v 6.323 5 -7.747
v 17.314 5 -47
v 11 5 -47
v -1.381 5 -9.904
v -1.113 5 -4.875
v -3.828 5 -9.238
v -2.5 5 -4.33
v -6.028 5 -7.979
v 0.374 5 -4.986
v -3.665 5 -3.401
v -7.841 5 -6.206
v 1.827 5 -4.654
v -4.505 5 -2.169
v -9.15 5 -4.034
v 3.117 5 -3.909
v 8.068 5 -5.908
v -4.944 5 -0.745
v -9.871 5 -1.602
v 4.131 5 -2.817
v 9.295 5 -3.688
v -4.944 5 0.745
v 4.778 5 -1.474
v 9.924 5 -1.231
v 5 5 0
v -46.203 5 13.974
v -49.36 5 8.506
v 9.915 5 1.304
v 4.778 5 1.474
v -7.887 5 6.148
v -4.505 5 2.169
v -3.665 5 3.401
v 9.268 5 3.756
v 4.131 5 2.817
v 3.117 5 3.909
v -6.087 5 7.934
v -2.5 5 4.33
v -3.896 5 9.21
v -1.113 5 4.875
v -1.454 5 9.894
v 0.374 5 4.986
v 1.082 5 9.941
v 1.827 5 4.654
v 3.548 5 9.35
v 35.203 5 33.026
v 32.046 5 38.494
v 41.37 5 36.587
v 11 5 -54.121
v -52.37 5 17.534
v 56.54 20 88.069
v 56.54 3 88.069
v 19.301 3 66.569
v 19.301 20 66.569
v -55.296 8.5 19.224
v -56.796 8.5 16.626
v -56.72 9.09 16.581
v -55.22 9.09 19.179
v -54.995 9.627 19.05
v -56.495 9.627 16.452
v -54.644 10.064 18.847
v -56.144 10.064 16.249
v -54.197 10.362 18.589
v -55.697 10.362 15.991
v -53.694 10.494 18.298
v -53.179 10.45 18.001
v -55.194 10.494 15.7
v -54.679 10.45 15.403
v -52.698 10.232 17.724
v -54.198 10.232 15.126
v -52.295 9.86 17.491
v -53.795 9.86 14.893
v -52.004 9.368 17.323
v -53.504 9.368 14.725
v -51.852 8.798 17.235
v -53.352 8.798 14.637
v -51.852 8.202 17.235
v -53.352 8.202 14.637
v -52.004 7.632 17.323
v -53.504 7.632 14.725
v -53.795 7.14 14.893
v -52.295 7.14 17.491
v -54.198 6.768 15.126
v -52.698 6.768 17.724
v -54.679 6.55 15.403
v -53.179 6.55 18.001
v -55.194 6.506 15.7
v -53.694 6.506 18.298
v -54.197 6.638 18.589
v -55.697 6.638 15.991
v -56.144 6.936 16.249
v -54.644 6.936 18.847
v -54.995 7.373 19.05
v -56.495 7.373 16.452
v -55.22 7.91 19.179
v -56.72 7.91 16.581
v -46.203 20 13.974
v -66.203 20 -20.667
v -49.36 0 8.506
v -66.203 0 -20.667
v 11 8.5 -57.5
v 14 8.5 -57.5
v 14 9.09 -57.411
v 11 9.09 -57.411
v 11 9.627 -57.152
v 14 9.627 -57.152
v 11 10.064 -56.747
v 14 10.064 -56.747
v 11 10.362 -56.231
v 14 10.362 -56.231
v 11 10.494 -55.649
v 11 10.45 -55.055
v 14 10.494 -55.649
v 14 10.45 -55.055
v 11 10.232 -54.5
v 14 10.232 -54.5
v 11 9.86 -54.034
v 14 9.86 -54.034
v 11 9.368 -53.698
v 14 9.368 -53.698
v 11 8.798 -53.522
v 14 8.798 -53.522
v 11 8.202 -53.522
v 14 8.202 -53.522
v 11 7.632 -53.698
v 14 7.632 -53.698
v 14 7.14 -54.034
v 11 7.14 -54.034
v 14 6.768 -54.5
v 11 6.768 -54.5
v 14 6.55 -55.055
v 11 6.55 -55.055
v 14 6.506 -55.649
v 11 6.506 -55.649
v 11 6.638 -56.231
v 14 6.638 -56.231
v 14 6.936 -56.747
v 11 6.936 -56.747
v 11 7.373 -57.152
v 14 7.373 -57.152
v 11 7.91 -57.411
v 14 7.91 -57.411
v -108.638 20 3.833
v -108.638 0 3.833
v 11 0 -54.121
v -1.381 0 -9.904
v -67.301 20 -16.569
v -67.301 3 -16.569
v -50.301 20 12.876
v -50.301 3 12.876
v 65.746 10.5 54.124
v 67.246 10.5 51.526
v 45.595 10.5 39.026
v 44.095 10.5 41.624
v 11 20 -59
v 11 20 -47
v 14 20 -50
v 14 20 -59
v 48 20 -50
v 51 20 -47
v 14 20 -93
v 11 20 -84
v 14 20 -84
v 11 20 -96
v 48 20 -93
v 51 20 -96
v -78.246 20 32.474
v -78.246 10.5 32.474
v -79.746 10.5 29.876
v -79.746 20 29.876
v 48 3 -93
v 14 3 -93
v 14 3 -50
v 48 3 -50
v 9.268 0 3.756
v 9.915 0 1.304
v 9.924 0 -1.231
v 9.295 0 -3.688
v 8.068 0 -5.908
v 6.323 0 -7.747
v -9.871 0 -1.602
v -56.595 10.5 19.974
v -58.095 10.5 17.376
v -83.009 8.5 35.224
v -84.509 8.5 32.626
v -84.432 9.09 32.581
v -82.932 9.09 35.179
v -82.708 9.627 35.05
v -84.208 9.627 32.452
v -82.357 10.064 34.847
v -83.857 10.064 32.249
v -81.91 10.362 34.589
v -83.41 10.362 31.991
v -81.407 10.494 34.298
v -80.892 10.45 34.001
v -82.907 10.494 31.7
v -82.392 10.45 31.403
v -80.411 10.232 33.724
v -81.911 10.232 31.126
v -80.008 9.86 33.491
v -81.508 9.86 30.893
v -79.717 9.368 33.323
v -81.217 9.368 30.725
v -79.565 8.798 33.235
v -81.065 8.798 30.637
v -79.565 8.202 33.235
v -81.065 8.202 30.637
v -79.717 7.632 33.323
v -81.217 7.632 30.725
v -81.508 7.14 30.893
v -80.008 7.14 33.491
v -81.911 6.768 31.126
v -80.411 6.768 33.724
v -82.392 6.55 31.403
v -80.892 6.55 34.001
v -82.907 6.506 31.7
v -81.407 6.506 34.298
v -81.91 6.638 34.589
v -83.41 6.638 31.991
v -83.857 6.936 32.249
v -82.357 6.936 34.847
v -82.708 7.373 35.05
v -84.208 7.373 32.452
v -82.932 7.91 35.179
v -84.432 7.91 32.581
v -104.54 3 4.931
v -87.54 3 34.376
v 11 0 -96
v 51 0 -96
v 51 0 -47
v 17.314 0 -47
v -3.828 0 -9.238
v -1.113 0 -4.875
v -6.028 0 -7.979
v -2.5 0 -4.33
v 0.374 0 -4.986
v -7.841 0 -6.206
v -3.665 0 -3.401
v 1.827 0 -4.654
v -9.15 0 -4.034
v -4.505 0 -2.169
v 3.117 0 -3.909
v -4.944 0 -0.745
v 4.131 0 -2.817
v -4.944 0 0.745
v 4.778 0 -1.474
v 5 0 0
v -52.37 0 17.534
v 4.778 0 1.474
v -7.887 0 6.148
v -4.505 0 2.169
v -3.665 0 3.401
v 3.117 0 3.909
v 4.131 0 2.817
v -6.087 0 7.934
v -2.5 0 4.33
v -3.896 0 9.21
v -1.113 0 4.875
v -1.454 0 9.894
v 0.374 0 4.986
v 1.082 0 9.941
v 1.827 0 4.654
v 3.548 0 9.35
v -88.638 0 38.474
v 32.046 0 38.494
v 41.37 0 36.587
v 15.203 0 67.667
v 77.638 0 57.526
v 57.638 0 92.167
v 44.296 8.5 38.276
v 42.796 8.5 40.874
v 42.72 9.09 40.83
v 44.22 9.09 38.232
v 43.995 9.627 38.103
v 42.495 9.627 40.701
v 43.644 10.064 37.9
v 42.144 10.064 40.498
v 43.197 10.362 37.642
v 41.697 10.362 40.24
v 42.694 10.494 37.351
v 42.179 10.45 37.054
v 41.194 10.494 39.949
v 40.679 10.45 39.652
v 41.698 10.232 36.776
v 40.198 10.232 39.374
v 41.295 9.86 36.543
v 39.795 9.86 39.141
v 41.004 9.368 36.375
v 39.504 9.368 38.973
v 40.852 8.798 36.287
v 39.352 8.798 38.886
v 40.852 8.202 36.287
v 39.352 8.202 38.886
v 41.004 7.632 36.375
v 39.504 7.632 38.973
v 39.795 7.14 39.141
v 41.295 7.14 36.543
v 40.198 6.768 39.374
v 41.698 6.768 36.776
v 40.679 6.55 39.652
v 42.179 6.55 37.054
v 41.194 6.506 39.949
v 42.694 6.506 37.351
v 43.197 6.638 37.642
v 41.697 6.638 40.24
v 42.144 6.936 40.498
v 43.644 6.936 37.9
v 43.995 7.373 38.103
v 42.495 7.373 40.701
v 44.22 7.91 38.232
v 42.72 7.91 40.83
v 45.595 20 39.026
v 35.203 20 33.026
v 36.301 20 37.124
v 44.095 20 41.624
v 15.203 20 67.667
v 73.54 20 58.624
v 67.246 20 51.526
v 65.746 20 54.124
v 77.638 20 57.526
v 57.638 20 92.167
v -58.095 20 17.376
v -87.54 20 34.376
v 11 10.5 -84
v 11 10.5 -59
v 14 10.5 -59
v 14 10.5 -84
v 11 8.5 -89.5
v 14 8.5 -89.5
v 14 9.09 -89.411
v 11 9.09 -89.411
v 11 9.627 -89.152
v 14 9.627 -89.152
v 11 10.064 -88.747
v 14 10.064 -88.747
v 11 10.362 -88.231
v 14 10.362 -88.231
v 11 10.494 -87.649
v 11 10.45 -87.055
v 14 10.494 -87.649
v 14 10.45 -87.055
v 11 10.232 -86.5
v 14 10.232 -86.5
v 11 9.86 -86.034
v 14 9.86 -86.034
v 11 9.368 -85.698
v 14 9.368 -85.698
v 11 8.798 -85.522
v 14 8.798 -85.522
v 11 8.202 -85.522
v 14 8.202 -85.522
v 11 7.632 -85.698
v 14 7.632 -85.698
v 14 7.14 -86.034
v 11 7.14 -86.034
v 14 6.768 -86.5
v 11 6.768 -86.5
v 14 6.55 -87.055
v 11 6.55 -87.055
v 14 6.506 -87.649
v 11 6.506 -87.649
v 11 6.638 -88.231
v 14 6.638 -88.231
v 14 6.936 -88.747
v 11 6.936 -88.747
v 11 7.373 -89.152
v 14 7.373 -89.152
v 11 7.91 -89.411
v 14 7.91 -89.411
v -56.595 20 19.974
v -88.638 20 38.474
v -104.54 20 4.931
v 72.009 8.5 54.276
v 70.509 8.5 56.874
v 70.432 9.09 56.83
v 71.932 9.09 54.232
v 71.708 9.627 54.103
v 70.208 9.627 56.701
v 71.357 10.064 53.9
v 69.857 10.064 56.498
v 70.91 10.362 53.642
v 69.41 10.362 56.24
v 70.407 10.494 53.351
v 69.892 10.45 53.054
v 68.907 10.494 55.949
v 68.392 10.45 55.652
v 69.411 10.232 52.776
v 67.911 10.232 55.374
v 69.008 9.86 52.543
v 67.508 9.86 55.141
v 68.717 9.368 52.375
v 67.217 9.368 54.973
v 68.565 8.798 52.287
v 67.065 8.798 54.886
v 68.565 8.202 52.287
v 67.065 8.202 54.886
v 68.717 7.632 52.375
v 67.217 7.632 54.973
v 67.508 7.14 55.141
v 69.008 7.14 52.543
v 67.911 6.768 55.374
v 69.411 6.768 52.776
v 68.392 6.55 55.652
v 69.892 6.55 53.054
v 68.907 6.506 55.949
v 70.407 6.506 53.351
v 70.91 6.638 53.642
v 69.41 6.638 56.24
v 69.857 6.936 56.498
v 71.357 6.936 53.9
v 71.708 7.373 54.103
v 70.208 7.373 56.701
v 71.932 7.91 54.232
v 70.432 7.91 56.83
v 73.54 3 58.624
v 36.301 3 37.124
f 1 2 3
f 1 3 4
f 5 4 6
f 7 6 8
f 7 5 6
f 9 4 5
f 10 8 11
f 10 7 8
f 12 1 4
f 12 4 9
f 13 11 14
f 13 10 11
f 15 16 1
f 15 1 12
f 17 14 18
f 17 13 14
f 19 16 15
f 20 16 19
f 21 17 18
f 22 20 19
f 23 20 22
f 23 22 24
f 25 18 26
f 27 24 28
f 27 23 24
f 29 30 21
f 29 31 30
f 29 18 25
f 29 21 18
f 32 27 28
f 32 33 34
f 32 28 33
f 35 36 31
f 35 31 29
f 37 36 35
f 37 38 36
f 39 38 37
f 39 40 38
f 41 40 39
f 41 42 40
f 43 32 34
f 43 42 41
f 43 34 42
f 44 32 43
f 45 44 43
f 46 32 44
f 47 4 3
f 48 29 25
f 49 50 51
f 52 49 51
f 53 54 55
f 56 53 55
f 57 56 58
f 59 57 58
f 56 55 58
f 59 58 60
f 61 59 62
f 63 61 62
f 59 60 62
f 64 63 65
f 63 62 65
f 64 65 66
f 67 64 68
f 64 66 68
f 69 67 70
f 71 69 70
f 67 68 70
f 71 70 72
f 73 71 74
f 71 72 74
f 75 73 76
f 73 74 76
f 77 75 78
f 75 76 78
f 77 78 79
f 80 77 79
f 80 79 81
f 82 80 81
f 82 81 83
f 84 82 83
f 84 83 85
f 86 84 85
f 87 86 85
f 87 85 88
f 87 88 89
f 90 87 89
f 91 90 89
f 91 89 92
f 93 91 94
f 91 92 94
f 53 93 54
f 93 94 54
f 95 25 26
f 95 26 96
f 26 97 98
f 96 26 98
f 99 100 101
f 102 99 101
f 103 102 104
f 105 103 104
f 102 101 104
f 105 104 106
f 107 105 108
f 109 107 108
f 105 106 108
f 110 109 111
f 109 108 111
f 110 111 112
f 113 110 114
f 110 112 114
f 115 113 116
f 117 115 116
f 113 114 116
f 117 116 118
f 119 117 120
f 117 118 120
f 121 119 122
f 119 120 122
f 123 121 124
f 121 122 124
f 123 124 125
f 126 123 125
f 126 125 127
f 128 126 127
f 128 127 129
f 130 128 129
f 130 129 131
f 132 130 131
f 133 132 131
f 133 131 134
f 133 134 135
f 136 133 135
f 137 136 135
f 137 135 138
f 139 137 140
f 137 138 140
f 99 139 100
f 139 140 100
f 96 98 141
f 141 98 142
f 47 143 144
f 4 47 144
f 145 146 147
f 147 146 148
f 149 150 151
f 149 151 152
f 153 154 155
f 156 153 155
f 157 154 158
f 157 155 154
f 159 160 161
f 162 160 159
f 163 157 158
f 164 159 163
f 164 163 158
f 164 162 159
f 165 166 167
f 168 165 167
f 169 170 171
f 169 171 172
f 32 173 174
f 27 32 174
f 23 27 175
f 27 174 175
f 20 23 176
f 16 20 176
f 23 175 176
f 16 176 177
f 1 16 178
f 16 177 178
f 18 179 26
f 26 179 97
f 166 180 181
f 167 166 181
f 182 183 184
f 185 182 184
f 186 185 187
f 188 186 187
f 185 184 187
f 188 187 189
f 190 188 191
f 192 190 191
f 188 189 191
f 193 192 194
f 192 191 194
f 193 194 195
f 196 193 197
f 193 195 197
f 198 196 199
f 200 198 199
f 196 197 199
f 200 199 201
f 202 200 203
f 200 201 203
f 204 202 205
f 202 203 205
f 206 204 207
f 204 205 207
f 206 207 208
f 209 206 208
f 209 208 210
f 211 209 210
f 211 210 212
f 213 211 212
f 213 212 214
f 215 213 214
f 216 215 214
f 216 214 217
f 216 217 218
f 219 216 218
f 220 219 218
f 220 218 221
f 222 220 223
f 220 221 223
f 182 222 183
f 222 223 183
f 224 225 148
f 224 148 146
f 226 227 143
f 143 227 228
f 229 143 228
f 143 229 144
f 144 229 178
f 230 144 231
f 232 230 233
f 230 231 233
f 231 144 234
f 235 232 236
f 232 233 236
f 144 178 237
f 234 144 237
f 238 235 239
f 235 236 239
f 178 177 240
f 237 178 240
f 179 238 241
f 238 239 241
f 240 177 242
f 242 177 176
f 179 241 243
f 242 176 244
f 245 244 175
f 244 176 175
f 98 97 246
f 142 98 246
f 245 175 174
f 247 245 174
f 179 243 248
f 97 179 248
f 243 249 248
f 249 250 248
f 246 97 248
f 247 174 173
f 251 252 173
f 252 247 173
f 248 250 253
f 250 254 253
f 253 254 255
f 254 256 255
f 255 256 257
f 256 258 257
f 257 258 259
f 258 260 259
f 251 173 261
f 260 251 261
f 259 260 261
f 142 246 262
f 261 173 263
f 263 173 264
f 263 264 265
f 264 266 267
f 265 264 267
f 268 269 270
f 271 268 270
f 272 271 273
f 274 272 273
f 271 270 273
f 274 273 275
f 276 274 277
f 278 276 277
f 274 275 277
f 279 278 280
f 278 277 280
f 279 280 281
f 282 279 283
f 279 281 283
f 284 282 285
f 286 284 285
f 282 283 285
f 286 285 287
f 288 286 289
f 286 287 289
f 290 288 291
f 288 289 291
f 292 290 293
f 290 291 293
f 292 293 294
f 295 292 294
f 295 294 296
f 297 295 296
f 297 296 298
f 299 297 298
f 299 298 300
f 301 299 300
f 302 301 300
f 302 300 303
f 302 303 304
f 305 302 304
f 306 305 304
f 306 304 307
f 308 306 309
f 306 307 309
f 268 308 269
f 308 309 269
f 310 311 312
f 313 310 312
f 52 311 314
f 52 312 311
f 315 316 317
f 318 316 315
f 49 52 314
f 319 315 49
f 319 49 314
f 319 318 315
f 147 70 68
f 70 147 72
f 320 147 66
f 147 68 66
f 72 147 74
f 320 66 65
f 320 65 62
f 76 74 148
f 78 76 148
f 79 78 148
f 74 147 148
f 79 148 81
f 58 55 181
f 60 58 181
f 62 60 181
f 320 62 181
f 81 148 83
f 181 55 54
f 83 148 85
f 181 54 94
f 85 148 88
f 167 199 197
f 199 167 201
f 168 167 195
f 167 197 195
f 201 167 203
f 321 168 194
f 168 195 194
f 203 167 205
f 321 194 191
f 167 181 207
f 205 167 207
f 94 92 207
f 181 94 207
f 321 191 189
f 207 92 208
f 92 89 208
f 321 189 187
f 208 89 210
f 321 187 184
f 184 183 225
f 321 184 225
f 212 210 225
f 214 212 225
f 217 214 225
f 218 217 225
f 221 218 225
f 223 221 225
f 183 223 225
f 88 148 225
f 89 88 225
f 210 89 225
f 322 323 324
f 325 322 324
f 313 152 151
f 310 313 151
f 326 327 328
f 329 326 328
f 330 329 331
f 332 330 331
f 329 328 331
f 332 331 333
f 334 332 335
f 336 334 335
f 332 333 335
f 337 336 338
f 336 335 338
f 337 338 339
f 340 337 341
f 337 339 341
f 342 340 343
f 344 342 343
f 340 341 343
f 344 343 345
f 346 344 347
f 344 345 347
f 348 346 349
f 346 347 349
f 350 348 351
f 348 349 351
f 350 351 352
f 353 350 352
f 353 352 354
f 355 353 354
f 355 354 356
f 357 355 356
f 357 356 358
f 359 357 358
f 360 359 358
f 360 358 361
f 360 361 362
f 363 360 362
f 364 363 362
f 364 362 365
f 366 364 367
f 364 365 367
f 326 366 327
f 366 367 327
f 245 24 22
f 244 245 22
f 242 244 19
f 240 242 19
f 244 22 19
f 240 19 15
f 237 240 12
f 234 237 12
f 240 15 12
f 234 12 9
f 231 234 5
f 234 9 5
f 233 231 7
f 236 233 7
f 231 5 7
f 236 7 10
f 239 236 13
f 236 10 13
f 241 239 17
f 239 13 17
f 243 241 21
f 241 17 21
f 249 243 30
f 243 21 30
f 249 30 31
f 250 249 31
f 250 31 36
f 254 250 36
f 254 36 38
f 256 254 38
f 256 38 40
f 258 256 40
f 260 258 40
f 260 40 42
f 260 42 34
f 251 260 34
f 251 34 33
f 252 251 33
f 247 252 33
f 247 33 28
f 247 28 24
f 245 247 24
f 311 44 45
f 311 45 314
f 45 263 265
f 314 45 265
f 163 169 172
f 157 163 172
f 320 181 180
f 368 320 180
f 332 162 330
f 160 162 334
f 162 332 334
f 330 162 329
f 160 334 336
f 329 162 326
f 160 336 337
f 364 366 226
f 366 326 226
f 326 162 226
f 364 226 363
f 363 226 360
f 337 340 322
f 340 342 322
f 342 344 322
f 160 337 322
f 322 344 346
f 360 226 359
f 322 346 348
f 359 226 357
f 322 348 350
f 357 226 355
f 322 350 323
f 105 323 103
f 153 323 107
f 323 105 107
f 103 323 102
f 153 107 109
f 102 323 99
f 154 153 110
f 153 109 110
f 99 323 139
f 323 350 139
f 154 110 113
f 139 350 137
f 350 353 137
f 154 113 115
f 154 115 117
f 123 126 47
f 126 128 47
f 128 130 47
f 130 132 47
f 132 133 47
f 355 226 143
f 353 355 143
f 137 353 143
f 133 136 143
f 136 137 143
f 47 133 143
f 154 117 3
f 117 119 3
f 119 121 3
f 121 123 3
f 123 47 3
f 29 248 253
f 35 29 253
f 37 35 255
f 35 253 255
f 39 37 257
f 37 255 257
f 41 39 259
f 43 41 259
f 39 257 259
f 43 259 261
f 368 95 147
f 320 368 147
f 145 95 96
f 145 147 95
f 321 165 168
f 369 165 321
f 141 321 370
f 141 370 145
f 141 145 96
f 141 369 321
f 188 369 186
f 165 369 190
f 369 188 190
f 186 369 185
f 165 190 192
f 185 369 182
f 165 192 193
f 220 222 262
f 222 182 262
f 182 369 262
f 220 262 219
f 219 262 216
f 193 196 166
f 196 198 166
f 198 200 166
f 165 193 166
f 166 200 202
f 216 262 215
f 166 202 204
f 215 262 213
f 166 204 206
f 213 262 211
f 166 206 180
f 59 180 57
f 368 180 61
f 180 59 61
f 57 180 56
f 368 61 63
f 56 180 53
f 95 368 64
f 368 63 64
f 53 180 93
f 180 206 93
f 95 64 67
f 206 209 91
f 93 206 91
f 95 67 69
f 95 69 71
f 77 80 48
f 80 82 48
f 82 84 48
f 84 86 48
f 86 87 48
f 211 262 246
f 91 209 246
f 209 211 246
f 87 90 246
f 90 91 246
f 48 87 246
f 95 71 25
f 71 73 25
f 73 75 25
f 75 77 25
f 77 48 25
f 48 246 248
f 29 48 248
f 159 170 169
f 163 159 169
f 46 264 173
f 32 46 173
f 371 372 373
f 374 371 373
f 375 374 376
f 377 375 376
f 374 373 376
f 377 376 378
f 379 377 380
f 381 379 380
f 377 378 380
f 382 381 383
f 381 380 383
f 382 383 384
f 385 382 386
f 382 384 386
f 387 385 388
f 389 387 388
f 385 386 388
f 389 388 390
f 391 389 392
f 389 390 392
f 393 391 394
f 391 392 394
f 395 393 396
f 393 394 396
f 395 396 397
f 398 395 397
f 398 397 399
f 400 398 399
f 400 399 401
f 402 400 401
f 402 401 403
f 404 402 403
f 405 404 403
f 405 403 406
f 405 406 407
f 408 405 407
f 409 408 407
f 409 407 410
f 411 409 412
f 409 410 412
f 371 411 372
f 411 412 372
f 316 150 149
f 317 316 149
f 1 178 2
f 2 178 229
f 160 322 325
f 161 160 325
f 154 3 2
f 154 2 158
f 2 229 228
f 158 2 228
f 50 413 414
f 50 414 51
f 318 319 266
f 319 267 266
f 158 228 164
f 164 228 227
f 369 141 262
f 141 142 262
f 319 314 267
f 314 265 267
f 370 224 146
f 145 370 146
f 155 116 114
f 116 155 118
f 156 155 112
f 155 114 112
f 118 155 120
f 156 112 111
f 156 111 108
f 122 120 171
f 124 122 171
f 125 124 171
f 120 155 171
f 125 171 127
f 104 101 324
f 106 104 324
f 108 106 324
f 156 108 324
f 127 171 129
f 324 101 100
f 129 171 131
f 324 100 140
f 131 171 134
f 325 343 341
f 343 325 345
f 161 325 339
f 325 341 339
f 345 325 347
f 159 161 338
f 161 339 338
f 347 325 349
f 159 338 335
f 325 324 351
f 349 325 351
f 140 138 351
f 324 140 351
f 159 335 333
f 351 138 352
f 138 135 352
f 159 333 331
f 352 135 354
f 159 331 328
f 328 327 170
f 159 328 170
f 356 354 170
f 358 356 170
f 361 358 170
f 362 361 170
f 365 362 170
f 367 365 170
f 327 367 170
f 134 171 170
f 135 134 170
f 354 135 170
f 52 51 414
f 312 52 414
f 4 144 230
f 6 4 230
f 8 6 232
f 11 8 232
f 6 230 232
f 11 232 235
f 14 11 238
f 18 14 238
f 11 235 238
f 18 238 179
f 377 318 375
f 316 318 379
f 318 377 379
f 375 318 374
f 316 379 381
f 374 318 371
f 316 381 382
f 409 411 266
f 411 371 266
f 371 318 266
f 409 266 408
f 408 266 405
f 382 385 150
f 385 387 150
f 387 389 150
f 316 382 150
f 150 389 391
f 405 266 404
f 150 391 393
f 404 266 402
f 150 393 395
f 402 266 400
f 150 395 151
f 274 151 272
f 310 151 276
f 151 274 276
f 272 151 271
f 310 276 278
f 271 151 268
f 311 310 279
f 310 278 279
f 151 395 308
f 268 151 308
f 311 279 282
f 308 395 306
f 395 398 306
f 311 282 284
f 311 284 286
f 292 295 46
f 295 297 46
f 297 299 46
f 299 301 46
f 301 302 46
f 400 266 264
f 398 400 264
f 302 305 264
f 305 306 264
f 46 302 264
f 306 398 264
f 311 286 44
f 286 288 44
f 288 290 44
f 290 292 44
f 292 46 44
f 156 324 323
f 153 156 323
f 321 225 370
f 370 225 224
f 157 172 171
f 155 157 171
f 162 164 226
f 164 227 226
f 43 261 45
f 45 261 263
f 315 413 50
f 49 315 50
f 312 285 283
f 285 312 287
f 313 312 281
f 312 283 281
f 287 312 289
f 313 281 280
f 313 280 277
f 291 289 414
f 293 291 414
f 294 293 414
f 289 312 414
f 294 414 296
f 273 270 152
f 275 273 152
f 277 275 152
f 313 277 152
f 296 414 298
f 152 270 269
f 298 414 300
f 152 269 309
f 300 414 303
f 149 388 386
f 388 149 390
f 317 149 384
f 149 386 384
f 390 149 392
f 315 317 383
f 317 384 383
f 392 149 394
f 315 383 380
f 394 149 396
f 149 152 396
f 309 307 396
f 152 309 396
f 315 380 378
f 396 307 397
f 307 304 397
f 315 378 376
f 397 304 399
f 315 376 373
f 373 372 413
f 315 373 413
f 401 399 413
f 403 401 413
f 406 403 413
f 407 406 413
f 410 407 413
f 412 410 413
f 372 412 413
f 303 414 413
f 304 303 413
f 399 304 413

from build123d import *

# Parameters (mm, degrees)
BOSS_EXTRUDE3_DEPTH = 5
SKETCH3_W           = 40
SKETCH3_H           = 49
SKETCH3_W_2         = 34
SKETCH3_H_2         = 43
BOSS_EXTRUDE4_DEPTH = 10.5
SKETCH1_W           = 34
SKETCH1_H           = 43
BOSS_EXTRUDE5_DEPTH = 3
BOSS_EXTRUDE6_DEPTH = 9.5
SKETCH6_R           = 2
CUT_EXTRUDE1_DEPTH  = 3
CIRPATTERN1_COUNT   = 3
SKETCH8_R           = 5
CUT_EXTRUDE2_DEPTH  = 9.5


with BuildPart() as part:
    # Sketch4 → Boss-Extrude3 (new body)
    with BuildSketch(Plane(origin=(0, 0, 0), x_dir=(1, 0, 0), z_dir=(0, 1, 0))):
        with BuildLine():
            Line((6.323055165, 7.747191322), (17.313841595, 47))
            Line((17.313841595, 47), (11, 47))
            Line((11, 47), (11, 54.120862841))
            Line((11, 54.120862841), (-1.380656992, 9.904230726))
            ThreePointArc((-1.380656992, 9.904230726), (-2.696299255, -9.629640197), (6.323055165, 7.747191322))
        make_face()
    boss_extrude3 = extrude(amount=BOSS_EXTRUDE3_DEPTH)

    # Sketch3 → Boss-Extrude4 (add)
    with BuildSketch(Plane(origin=(0, 0, 0), x_dir=(1, 0, 0), z_dir=(0, 1, 0))):
        with Locations((31, 71.5)):
            Rectangle(SKETCH3_W, SKETCH3_H)
        with Locations((31, 71.5)):
            Rectangle(SKETCH3_W_2, SKETCH3_H_2, mode=Mode.SUBTRACT)
    boss_extrude4 = extrude(amount=BOSS_EXTRUDE4_DEPTH)

    # Sketch1 → Boss-Extrude5 (add)
    with BuildSketch(Plane(origin=(0, 0, 0), x_dir=(1, 0, 0), z_dir=(0, 1, 0))):
        with Locations((31, 71.5)):
            Rectangle(SKETCH1_W, SKETCH1_H)
    boss_extrude5 = extrude(amount=BOSS_EXTRUDE5_DEPTH)

    # Sketch7 → Boss-Extrude6 (add)
    with BuildSketch(Plane(origin=(0, 10.5, 0), x_dir=(1, 0, 0), z_dir=(0, 1, 0))):
        Polygon((14, 50), (14, 59), (11, 59), (11, 47), (51, 47), (51, 96), (11, 96), (11, 84), (14, 84), (14, 93), (48, 93), (48, 50), align=None)
    boss_extrude6 = extrude(amount=BOSS_EXTRUDE6_DEPTH)

    # Sketch6 → Cut-Extrude1 (cut)
    with BuildSketch(Plane(origin=(14, 0, 0), x_dir=(0, 0, -1), z_dir=(1, 0, 0))):
        with Locations((55.5, 8.5)):
            Circle(SKETCH6_R)
        with Locations((87.5, 8.5)):
            Circle(SKETCH6_R)
    cut_extrude1 = extrude(amount=-CUT_EXTRUDE1_DEPTH, mode=Mode.SUBTRACT)

    # CirPattern1: Boss-Extrude3, Boss-Extrude4, Boss-Extrude5, Boss-Extrude6, Cut-Extrude1 ×3 about axis
    cirpattern1_axis = Axis((0, 0, 0), (0, 1, 0))
    for i in range(1, CIRPATTERN1_COUNT):
        add(boss_extrude3.rotate(cirpattern1_axis, i * 360 / CIRPATTERN1_COUNT))
        add(boss_extrude4.rotate(cirpattern1_axis, i * 360 / CIRPATTERN1_COUNT))
        add(boss_extrude5.rotate(cirpattern1_axis, i * 360 / CIRPATTERN1_COUNT))
        add(boss_extrude6.rotate(cirpattern1_axis, i * 360 / CIRPATTERN1_COUNT))
        add(cut_extrude1.rotate(cirpattern1_axis, i * 360 / CIRPATTERN1_COUNT), mode=Mode.SUBTRACT)

    # Sketch8 → Cut-Extrude2 (cut)
    with BuildSketch(Plane(origin=(0, 5, 0), x_dir=(1, 0, 0), z_dir=(0, 1, 0))):
        Circle(SKETCH8_R)
    extrude(amount=-CUT_EXTRUDE2_DEPTH, mode=Mode.SUBTRACT)


solid = part.part
